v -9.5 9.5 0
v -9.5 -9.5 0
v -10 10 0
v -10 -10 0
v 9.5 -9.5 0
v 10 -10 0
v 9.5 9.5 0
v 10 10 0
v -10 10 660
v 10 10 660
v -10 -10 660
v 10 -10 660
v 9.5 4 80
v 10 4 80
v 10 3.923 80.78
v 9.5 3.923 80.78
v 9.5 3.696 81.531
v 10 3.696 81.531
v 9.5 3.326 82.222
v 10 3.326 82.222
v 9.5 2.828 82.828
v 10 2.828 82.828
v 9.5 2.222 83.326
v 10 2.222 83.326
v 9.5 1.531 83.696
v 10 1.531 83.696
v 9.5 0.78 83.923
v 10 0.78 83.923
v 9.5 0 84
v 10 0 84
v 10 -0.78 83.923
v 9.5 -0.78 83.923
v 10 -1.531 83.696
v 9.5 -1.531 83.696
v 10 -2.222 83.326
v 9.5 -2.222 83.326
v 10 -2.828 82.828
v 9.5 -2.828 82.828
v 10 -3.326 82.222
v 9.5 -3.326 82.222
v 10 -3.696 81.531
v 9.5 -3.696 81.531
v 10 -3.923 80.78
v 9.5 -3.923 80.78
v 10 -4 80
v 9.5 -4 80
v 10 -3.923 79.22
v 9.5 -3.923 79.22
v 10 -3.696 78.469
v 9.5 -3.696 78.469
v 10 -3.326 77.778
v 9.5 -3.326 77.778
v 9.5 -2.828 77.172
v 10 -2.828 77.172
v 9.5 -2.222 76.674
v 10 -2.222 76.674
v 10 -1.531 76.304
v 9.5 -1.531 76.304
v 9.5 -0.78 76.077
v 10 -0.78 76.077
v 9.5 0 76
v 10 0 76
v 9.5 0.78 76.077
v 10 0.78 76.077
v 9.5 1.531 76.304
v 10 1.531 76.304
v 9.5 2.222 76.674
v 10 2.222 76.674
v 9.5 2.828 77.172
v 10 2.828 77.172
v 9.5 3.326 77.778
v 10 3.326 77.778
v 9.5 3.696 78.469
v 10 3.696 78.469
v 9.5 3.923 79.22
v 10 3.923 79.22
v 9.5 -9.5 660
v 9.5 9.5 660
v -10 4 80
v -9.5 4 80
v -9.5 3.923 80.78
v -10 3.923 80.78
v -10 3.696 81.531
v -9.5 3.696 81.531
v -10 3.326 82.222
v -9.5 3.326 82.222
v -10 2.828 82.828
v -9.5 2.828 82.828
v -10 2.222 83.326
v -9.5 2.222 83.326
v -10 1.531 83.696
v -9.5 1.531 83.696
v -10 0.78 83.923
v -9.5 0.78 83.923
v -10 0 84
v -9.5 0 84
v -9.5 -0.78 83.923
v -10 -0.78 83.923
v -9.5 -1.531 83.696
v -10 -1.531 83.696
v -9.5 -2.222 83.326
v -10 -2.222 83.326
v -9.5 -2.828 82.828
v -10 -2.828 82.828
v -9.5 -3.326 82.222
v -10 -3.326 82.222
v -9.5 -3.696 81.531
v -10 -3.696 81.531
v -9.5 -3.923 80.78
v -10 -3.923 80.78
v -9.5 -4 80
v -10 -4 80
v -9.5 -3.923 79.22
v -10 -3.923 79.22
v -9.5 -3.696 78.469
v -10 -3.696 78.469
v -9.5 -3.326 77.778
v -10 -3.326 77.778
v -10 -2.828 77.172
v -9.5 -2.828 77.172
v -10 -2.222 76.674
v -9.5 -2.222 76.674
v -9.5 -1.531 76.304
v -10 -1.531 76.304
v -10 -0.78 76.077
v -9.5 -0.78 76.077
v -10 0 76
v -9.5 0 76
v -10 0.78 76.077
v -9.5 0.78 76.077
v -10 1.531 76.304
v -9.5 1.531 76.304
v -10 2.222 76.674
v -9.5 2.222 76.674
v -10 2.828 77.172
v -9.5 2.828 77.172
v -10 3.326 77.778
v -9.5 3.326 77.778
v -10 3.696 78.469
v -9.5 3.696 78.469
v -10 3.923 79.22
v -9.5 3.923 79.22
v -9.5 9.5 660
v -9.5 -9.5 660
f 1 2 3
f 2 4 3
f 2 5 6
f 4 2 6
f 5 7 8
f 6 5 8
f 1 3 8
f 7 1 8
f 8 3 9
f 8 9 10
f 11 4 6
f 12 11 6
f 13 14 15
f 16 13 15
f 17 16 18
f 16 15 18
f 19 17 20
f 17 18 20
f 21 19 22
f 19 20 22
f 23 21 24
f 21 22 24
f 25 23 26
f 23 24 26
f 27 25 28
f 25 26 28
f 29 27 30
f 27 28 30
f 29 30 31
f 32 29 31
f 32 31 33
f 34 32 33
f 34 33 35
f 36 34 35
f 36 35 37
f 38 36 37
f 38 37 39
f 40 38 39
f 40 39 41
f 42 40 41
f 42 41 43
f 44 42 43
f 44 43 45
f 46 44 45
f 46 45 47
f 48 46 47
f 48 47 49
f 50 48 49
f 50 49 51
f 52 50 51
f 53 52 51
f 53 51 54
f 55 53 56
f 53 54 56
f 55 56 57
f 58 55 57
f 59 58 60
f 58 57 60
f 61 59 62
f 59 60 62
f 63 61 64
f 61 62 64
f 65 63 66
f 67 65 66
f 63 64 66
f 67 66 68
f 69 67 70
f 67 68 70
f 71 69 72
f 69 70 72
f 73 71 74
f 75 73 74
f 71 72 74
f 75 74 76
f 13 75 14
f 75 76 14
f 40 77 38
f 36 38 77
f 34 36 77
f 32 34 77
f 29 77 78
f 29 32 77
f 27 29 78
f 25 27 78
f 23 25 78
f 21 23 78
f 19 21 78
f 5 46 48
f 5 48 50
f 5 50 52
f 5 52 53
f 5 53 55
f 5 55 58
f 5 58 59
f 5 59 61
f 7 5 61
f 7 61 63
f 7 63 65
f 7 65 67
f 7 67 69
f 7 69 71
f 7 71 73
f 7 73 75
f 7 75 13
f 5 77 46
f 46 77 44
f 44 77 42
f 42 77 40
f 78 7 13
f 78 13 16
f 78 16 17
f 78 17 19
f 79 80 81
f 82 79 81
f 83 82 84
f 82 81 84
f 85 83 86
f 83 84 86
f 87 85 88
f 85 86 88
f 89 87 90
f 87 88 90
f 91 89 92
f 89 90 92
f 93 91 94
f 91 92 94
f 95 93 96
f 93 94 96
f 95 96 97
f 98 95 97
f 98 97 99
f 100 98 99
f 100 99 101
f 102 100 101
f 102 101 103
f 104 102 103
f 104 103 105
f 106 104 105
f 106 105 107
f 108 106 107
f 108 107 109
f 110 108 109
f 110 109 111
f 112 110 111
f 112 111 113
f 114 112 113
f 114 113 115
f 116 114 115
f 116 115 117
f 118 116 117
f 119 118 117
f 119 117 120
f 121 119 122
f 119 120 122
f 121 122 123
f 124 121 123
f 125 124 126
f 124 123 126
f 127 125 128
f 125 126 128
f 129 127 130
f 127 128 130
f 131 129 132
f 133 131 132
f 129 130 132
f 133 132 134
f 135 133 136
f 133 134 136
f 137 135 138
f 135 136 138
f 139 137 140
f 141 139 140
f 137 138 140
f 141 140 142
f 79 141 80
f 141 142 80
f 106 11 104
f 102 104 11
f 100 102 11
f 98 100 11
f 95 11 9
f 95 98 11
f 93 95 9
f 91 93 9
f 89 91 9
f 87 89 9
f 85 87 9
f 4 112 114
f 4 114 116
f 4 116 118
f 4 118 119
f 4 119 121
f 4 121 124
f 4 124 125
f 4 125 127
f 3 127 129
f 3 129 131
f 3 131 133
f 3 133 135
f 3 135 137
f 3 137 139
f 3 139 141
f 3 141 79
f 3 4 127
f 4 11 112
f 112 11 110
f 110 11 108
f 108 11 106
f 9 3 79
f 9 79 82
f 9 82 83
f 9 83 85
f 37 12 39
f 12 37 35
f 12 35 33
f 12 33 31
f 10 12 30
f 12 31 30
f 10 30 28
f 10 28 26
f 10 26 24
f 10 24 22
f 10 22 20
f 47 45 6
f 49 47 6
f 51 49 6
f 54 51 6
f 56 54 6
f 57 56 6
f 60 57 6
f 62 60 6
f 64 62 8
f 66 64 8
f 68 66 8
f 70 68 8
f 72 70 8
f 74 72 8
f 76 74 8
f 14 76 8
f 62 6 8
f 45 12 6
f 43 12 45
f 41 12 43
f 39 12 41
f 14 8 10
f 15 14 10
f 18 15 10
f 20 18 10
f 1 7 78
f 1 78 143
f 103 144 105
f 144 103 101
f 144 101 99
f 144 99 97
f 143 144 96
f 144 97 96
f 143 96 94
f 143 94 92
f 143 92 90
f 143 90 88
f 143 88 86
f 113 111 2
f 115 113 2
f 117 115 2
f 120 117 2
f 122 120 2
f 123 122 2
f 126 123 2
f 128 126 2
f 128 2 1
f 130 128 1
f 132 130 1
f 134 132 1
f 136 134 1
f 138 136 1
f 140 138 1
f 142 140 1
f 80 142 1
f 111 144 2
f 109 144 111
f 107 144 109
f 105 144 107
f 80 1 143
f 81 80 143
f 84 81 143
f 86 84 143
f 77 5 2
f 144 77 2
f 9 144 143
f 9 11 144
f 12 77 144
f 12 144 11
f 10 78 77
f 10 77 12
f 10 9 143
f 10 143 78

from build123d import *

# Parameters (mm, degrees)
SKETCH1_W           = 20
SKETCH1_H           = 20
BOSS_EXTRUDE1_DEPTH = 660
SKETCH2_W           = 19
SKETCH2_H           = 19
CUT_EXTRUDE1_DEPTH  = 660
SKETCH3_R           = 4
CUT_EXTRUDE2_DEPTH  = 20


with BuildPart() as part:
    # Sketch1 → Boss-Extrude1 (new body)
    with BuildSketch(Plane.XY):
        Rectangle(SKETCH1_W, SKETCH1_H)
    extrude(amount=BOSS_EXTRUDE1_DEPTH)

    # Sketch2 → Cut-Extrude1 (cut)
    with BuildSketch(Plane(origin=(0, 0, 0), x_dir=(-1, 0, 0), z_dir=(0, 0, -1))):
        Rectangle(SKETCH2_W, SKETCH2_H)
    extrude(amount=-CUT_EXTRUDE1_DEPTH, mode=Mode.SUBTRACT)

    # Sketch3 → Cut-Extrude2 (cut)
    with BuildSketch(Plane(origin=(10, 0, 0), x_dir=(0, 0, -1), z_dir=(1, 0, 0))):
        with Locations(Location((-80, 0, 0), (0, 0, 90))):
            Circle(SKETCH3_R)
    extrude(amount=-CUT_EXTRUDE2_DEPTH, mode=Mode.SUBTRACT)


solid = part.part
